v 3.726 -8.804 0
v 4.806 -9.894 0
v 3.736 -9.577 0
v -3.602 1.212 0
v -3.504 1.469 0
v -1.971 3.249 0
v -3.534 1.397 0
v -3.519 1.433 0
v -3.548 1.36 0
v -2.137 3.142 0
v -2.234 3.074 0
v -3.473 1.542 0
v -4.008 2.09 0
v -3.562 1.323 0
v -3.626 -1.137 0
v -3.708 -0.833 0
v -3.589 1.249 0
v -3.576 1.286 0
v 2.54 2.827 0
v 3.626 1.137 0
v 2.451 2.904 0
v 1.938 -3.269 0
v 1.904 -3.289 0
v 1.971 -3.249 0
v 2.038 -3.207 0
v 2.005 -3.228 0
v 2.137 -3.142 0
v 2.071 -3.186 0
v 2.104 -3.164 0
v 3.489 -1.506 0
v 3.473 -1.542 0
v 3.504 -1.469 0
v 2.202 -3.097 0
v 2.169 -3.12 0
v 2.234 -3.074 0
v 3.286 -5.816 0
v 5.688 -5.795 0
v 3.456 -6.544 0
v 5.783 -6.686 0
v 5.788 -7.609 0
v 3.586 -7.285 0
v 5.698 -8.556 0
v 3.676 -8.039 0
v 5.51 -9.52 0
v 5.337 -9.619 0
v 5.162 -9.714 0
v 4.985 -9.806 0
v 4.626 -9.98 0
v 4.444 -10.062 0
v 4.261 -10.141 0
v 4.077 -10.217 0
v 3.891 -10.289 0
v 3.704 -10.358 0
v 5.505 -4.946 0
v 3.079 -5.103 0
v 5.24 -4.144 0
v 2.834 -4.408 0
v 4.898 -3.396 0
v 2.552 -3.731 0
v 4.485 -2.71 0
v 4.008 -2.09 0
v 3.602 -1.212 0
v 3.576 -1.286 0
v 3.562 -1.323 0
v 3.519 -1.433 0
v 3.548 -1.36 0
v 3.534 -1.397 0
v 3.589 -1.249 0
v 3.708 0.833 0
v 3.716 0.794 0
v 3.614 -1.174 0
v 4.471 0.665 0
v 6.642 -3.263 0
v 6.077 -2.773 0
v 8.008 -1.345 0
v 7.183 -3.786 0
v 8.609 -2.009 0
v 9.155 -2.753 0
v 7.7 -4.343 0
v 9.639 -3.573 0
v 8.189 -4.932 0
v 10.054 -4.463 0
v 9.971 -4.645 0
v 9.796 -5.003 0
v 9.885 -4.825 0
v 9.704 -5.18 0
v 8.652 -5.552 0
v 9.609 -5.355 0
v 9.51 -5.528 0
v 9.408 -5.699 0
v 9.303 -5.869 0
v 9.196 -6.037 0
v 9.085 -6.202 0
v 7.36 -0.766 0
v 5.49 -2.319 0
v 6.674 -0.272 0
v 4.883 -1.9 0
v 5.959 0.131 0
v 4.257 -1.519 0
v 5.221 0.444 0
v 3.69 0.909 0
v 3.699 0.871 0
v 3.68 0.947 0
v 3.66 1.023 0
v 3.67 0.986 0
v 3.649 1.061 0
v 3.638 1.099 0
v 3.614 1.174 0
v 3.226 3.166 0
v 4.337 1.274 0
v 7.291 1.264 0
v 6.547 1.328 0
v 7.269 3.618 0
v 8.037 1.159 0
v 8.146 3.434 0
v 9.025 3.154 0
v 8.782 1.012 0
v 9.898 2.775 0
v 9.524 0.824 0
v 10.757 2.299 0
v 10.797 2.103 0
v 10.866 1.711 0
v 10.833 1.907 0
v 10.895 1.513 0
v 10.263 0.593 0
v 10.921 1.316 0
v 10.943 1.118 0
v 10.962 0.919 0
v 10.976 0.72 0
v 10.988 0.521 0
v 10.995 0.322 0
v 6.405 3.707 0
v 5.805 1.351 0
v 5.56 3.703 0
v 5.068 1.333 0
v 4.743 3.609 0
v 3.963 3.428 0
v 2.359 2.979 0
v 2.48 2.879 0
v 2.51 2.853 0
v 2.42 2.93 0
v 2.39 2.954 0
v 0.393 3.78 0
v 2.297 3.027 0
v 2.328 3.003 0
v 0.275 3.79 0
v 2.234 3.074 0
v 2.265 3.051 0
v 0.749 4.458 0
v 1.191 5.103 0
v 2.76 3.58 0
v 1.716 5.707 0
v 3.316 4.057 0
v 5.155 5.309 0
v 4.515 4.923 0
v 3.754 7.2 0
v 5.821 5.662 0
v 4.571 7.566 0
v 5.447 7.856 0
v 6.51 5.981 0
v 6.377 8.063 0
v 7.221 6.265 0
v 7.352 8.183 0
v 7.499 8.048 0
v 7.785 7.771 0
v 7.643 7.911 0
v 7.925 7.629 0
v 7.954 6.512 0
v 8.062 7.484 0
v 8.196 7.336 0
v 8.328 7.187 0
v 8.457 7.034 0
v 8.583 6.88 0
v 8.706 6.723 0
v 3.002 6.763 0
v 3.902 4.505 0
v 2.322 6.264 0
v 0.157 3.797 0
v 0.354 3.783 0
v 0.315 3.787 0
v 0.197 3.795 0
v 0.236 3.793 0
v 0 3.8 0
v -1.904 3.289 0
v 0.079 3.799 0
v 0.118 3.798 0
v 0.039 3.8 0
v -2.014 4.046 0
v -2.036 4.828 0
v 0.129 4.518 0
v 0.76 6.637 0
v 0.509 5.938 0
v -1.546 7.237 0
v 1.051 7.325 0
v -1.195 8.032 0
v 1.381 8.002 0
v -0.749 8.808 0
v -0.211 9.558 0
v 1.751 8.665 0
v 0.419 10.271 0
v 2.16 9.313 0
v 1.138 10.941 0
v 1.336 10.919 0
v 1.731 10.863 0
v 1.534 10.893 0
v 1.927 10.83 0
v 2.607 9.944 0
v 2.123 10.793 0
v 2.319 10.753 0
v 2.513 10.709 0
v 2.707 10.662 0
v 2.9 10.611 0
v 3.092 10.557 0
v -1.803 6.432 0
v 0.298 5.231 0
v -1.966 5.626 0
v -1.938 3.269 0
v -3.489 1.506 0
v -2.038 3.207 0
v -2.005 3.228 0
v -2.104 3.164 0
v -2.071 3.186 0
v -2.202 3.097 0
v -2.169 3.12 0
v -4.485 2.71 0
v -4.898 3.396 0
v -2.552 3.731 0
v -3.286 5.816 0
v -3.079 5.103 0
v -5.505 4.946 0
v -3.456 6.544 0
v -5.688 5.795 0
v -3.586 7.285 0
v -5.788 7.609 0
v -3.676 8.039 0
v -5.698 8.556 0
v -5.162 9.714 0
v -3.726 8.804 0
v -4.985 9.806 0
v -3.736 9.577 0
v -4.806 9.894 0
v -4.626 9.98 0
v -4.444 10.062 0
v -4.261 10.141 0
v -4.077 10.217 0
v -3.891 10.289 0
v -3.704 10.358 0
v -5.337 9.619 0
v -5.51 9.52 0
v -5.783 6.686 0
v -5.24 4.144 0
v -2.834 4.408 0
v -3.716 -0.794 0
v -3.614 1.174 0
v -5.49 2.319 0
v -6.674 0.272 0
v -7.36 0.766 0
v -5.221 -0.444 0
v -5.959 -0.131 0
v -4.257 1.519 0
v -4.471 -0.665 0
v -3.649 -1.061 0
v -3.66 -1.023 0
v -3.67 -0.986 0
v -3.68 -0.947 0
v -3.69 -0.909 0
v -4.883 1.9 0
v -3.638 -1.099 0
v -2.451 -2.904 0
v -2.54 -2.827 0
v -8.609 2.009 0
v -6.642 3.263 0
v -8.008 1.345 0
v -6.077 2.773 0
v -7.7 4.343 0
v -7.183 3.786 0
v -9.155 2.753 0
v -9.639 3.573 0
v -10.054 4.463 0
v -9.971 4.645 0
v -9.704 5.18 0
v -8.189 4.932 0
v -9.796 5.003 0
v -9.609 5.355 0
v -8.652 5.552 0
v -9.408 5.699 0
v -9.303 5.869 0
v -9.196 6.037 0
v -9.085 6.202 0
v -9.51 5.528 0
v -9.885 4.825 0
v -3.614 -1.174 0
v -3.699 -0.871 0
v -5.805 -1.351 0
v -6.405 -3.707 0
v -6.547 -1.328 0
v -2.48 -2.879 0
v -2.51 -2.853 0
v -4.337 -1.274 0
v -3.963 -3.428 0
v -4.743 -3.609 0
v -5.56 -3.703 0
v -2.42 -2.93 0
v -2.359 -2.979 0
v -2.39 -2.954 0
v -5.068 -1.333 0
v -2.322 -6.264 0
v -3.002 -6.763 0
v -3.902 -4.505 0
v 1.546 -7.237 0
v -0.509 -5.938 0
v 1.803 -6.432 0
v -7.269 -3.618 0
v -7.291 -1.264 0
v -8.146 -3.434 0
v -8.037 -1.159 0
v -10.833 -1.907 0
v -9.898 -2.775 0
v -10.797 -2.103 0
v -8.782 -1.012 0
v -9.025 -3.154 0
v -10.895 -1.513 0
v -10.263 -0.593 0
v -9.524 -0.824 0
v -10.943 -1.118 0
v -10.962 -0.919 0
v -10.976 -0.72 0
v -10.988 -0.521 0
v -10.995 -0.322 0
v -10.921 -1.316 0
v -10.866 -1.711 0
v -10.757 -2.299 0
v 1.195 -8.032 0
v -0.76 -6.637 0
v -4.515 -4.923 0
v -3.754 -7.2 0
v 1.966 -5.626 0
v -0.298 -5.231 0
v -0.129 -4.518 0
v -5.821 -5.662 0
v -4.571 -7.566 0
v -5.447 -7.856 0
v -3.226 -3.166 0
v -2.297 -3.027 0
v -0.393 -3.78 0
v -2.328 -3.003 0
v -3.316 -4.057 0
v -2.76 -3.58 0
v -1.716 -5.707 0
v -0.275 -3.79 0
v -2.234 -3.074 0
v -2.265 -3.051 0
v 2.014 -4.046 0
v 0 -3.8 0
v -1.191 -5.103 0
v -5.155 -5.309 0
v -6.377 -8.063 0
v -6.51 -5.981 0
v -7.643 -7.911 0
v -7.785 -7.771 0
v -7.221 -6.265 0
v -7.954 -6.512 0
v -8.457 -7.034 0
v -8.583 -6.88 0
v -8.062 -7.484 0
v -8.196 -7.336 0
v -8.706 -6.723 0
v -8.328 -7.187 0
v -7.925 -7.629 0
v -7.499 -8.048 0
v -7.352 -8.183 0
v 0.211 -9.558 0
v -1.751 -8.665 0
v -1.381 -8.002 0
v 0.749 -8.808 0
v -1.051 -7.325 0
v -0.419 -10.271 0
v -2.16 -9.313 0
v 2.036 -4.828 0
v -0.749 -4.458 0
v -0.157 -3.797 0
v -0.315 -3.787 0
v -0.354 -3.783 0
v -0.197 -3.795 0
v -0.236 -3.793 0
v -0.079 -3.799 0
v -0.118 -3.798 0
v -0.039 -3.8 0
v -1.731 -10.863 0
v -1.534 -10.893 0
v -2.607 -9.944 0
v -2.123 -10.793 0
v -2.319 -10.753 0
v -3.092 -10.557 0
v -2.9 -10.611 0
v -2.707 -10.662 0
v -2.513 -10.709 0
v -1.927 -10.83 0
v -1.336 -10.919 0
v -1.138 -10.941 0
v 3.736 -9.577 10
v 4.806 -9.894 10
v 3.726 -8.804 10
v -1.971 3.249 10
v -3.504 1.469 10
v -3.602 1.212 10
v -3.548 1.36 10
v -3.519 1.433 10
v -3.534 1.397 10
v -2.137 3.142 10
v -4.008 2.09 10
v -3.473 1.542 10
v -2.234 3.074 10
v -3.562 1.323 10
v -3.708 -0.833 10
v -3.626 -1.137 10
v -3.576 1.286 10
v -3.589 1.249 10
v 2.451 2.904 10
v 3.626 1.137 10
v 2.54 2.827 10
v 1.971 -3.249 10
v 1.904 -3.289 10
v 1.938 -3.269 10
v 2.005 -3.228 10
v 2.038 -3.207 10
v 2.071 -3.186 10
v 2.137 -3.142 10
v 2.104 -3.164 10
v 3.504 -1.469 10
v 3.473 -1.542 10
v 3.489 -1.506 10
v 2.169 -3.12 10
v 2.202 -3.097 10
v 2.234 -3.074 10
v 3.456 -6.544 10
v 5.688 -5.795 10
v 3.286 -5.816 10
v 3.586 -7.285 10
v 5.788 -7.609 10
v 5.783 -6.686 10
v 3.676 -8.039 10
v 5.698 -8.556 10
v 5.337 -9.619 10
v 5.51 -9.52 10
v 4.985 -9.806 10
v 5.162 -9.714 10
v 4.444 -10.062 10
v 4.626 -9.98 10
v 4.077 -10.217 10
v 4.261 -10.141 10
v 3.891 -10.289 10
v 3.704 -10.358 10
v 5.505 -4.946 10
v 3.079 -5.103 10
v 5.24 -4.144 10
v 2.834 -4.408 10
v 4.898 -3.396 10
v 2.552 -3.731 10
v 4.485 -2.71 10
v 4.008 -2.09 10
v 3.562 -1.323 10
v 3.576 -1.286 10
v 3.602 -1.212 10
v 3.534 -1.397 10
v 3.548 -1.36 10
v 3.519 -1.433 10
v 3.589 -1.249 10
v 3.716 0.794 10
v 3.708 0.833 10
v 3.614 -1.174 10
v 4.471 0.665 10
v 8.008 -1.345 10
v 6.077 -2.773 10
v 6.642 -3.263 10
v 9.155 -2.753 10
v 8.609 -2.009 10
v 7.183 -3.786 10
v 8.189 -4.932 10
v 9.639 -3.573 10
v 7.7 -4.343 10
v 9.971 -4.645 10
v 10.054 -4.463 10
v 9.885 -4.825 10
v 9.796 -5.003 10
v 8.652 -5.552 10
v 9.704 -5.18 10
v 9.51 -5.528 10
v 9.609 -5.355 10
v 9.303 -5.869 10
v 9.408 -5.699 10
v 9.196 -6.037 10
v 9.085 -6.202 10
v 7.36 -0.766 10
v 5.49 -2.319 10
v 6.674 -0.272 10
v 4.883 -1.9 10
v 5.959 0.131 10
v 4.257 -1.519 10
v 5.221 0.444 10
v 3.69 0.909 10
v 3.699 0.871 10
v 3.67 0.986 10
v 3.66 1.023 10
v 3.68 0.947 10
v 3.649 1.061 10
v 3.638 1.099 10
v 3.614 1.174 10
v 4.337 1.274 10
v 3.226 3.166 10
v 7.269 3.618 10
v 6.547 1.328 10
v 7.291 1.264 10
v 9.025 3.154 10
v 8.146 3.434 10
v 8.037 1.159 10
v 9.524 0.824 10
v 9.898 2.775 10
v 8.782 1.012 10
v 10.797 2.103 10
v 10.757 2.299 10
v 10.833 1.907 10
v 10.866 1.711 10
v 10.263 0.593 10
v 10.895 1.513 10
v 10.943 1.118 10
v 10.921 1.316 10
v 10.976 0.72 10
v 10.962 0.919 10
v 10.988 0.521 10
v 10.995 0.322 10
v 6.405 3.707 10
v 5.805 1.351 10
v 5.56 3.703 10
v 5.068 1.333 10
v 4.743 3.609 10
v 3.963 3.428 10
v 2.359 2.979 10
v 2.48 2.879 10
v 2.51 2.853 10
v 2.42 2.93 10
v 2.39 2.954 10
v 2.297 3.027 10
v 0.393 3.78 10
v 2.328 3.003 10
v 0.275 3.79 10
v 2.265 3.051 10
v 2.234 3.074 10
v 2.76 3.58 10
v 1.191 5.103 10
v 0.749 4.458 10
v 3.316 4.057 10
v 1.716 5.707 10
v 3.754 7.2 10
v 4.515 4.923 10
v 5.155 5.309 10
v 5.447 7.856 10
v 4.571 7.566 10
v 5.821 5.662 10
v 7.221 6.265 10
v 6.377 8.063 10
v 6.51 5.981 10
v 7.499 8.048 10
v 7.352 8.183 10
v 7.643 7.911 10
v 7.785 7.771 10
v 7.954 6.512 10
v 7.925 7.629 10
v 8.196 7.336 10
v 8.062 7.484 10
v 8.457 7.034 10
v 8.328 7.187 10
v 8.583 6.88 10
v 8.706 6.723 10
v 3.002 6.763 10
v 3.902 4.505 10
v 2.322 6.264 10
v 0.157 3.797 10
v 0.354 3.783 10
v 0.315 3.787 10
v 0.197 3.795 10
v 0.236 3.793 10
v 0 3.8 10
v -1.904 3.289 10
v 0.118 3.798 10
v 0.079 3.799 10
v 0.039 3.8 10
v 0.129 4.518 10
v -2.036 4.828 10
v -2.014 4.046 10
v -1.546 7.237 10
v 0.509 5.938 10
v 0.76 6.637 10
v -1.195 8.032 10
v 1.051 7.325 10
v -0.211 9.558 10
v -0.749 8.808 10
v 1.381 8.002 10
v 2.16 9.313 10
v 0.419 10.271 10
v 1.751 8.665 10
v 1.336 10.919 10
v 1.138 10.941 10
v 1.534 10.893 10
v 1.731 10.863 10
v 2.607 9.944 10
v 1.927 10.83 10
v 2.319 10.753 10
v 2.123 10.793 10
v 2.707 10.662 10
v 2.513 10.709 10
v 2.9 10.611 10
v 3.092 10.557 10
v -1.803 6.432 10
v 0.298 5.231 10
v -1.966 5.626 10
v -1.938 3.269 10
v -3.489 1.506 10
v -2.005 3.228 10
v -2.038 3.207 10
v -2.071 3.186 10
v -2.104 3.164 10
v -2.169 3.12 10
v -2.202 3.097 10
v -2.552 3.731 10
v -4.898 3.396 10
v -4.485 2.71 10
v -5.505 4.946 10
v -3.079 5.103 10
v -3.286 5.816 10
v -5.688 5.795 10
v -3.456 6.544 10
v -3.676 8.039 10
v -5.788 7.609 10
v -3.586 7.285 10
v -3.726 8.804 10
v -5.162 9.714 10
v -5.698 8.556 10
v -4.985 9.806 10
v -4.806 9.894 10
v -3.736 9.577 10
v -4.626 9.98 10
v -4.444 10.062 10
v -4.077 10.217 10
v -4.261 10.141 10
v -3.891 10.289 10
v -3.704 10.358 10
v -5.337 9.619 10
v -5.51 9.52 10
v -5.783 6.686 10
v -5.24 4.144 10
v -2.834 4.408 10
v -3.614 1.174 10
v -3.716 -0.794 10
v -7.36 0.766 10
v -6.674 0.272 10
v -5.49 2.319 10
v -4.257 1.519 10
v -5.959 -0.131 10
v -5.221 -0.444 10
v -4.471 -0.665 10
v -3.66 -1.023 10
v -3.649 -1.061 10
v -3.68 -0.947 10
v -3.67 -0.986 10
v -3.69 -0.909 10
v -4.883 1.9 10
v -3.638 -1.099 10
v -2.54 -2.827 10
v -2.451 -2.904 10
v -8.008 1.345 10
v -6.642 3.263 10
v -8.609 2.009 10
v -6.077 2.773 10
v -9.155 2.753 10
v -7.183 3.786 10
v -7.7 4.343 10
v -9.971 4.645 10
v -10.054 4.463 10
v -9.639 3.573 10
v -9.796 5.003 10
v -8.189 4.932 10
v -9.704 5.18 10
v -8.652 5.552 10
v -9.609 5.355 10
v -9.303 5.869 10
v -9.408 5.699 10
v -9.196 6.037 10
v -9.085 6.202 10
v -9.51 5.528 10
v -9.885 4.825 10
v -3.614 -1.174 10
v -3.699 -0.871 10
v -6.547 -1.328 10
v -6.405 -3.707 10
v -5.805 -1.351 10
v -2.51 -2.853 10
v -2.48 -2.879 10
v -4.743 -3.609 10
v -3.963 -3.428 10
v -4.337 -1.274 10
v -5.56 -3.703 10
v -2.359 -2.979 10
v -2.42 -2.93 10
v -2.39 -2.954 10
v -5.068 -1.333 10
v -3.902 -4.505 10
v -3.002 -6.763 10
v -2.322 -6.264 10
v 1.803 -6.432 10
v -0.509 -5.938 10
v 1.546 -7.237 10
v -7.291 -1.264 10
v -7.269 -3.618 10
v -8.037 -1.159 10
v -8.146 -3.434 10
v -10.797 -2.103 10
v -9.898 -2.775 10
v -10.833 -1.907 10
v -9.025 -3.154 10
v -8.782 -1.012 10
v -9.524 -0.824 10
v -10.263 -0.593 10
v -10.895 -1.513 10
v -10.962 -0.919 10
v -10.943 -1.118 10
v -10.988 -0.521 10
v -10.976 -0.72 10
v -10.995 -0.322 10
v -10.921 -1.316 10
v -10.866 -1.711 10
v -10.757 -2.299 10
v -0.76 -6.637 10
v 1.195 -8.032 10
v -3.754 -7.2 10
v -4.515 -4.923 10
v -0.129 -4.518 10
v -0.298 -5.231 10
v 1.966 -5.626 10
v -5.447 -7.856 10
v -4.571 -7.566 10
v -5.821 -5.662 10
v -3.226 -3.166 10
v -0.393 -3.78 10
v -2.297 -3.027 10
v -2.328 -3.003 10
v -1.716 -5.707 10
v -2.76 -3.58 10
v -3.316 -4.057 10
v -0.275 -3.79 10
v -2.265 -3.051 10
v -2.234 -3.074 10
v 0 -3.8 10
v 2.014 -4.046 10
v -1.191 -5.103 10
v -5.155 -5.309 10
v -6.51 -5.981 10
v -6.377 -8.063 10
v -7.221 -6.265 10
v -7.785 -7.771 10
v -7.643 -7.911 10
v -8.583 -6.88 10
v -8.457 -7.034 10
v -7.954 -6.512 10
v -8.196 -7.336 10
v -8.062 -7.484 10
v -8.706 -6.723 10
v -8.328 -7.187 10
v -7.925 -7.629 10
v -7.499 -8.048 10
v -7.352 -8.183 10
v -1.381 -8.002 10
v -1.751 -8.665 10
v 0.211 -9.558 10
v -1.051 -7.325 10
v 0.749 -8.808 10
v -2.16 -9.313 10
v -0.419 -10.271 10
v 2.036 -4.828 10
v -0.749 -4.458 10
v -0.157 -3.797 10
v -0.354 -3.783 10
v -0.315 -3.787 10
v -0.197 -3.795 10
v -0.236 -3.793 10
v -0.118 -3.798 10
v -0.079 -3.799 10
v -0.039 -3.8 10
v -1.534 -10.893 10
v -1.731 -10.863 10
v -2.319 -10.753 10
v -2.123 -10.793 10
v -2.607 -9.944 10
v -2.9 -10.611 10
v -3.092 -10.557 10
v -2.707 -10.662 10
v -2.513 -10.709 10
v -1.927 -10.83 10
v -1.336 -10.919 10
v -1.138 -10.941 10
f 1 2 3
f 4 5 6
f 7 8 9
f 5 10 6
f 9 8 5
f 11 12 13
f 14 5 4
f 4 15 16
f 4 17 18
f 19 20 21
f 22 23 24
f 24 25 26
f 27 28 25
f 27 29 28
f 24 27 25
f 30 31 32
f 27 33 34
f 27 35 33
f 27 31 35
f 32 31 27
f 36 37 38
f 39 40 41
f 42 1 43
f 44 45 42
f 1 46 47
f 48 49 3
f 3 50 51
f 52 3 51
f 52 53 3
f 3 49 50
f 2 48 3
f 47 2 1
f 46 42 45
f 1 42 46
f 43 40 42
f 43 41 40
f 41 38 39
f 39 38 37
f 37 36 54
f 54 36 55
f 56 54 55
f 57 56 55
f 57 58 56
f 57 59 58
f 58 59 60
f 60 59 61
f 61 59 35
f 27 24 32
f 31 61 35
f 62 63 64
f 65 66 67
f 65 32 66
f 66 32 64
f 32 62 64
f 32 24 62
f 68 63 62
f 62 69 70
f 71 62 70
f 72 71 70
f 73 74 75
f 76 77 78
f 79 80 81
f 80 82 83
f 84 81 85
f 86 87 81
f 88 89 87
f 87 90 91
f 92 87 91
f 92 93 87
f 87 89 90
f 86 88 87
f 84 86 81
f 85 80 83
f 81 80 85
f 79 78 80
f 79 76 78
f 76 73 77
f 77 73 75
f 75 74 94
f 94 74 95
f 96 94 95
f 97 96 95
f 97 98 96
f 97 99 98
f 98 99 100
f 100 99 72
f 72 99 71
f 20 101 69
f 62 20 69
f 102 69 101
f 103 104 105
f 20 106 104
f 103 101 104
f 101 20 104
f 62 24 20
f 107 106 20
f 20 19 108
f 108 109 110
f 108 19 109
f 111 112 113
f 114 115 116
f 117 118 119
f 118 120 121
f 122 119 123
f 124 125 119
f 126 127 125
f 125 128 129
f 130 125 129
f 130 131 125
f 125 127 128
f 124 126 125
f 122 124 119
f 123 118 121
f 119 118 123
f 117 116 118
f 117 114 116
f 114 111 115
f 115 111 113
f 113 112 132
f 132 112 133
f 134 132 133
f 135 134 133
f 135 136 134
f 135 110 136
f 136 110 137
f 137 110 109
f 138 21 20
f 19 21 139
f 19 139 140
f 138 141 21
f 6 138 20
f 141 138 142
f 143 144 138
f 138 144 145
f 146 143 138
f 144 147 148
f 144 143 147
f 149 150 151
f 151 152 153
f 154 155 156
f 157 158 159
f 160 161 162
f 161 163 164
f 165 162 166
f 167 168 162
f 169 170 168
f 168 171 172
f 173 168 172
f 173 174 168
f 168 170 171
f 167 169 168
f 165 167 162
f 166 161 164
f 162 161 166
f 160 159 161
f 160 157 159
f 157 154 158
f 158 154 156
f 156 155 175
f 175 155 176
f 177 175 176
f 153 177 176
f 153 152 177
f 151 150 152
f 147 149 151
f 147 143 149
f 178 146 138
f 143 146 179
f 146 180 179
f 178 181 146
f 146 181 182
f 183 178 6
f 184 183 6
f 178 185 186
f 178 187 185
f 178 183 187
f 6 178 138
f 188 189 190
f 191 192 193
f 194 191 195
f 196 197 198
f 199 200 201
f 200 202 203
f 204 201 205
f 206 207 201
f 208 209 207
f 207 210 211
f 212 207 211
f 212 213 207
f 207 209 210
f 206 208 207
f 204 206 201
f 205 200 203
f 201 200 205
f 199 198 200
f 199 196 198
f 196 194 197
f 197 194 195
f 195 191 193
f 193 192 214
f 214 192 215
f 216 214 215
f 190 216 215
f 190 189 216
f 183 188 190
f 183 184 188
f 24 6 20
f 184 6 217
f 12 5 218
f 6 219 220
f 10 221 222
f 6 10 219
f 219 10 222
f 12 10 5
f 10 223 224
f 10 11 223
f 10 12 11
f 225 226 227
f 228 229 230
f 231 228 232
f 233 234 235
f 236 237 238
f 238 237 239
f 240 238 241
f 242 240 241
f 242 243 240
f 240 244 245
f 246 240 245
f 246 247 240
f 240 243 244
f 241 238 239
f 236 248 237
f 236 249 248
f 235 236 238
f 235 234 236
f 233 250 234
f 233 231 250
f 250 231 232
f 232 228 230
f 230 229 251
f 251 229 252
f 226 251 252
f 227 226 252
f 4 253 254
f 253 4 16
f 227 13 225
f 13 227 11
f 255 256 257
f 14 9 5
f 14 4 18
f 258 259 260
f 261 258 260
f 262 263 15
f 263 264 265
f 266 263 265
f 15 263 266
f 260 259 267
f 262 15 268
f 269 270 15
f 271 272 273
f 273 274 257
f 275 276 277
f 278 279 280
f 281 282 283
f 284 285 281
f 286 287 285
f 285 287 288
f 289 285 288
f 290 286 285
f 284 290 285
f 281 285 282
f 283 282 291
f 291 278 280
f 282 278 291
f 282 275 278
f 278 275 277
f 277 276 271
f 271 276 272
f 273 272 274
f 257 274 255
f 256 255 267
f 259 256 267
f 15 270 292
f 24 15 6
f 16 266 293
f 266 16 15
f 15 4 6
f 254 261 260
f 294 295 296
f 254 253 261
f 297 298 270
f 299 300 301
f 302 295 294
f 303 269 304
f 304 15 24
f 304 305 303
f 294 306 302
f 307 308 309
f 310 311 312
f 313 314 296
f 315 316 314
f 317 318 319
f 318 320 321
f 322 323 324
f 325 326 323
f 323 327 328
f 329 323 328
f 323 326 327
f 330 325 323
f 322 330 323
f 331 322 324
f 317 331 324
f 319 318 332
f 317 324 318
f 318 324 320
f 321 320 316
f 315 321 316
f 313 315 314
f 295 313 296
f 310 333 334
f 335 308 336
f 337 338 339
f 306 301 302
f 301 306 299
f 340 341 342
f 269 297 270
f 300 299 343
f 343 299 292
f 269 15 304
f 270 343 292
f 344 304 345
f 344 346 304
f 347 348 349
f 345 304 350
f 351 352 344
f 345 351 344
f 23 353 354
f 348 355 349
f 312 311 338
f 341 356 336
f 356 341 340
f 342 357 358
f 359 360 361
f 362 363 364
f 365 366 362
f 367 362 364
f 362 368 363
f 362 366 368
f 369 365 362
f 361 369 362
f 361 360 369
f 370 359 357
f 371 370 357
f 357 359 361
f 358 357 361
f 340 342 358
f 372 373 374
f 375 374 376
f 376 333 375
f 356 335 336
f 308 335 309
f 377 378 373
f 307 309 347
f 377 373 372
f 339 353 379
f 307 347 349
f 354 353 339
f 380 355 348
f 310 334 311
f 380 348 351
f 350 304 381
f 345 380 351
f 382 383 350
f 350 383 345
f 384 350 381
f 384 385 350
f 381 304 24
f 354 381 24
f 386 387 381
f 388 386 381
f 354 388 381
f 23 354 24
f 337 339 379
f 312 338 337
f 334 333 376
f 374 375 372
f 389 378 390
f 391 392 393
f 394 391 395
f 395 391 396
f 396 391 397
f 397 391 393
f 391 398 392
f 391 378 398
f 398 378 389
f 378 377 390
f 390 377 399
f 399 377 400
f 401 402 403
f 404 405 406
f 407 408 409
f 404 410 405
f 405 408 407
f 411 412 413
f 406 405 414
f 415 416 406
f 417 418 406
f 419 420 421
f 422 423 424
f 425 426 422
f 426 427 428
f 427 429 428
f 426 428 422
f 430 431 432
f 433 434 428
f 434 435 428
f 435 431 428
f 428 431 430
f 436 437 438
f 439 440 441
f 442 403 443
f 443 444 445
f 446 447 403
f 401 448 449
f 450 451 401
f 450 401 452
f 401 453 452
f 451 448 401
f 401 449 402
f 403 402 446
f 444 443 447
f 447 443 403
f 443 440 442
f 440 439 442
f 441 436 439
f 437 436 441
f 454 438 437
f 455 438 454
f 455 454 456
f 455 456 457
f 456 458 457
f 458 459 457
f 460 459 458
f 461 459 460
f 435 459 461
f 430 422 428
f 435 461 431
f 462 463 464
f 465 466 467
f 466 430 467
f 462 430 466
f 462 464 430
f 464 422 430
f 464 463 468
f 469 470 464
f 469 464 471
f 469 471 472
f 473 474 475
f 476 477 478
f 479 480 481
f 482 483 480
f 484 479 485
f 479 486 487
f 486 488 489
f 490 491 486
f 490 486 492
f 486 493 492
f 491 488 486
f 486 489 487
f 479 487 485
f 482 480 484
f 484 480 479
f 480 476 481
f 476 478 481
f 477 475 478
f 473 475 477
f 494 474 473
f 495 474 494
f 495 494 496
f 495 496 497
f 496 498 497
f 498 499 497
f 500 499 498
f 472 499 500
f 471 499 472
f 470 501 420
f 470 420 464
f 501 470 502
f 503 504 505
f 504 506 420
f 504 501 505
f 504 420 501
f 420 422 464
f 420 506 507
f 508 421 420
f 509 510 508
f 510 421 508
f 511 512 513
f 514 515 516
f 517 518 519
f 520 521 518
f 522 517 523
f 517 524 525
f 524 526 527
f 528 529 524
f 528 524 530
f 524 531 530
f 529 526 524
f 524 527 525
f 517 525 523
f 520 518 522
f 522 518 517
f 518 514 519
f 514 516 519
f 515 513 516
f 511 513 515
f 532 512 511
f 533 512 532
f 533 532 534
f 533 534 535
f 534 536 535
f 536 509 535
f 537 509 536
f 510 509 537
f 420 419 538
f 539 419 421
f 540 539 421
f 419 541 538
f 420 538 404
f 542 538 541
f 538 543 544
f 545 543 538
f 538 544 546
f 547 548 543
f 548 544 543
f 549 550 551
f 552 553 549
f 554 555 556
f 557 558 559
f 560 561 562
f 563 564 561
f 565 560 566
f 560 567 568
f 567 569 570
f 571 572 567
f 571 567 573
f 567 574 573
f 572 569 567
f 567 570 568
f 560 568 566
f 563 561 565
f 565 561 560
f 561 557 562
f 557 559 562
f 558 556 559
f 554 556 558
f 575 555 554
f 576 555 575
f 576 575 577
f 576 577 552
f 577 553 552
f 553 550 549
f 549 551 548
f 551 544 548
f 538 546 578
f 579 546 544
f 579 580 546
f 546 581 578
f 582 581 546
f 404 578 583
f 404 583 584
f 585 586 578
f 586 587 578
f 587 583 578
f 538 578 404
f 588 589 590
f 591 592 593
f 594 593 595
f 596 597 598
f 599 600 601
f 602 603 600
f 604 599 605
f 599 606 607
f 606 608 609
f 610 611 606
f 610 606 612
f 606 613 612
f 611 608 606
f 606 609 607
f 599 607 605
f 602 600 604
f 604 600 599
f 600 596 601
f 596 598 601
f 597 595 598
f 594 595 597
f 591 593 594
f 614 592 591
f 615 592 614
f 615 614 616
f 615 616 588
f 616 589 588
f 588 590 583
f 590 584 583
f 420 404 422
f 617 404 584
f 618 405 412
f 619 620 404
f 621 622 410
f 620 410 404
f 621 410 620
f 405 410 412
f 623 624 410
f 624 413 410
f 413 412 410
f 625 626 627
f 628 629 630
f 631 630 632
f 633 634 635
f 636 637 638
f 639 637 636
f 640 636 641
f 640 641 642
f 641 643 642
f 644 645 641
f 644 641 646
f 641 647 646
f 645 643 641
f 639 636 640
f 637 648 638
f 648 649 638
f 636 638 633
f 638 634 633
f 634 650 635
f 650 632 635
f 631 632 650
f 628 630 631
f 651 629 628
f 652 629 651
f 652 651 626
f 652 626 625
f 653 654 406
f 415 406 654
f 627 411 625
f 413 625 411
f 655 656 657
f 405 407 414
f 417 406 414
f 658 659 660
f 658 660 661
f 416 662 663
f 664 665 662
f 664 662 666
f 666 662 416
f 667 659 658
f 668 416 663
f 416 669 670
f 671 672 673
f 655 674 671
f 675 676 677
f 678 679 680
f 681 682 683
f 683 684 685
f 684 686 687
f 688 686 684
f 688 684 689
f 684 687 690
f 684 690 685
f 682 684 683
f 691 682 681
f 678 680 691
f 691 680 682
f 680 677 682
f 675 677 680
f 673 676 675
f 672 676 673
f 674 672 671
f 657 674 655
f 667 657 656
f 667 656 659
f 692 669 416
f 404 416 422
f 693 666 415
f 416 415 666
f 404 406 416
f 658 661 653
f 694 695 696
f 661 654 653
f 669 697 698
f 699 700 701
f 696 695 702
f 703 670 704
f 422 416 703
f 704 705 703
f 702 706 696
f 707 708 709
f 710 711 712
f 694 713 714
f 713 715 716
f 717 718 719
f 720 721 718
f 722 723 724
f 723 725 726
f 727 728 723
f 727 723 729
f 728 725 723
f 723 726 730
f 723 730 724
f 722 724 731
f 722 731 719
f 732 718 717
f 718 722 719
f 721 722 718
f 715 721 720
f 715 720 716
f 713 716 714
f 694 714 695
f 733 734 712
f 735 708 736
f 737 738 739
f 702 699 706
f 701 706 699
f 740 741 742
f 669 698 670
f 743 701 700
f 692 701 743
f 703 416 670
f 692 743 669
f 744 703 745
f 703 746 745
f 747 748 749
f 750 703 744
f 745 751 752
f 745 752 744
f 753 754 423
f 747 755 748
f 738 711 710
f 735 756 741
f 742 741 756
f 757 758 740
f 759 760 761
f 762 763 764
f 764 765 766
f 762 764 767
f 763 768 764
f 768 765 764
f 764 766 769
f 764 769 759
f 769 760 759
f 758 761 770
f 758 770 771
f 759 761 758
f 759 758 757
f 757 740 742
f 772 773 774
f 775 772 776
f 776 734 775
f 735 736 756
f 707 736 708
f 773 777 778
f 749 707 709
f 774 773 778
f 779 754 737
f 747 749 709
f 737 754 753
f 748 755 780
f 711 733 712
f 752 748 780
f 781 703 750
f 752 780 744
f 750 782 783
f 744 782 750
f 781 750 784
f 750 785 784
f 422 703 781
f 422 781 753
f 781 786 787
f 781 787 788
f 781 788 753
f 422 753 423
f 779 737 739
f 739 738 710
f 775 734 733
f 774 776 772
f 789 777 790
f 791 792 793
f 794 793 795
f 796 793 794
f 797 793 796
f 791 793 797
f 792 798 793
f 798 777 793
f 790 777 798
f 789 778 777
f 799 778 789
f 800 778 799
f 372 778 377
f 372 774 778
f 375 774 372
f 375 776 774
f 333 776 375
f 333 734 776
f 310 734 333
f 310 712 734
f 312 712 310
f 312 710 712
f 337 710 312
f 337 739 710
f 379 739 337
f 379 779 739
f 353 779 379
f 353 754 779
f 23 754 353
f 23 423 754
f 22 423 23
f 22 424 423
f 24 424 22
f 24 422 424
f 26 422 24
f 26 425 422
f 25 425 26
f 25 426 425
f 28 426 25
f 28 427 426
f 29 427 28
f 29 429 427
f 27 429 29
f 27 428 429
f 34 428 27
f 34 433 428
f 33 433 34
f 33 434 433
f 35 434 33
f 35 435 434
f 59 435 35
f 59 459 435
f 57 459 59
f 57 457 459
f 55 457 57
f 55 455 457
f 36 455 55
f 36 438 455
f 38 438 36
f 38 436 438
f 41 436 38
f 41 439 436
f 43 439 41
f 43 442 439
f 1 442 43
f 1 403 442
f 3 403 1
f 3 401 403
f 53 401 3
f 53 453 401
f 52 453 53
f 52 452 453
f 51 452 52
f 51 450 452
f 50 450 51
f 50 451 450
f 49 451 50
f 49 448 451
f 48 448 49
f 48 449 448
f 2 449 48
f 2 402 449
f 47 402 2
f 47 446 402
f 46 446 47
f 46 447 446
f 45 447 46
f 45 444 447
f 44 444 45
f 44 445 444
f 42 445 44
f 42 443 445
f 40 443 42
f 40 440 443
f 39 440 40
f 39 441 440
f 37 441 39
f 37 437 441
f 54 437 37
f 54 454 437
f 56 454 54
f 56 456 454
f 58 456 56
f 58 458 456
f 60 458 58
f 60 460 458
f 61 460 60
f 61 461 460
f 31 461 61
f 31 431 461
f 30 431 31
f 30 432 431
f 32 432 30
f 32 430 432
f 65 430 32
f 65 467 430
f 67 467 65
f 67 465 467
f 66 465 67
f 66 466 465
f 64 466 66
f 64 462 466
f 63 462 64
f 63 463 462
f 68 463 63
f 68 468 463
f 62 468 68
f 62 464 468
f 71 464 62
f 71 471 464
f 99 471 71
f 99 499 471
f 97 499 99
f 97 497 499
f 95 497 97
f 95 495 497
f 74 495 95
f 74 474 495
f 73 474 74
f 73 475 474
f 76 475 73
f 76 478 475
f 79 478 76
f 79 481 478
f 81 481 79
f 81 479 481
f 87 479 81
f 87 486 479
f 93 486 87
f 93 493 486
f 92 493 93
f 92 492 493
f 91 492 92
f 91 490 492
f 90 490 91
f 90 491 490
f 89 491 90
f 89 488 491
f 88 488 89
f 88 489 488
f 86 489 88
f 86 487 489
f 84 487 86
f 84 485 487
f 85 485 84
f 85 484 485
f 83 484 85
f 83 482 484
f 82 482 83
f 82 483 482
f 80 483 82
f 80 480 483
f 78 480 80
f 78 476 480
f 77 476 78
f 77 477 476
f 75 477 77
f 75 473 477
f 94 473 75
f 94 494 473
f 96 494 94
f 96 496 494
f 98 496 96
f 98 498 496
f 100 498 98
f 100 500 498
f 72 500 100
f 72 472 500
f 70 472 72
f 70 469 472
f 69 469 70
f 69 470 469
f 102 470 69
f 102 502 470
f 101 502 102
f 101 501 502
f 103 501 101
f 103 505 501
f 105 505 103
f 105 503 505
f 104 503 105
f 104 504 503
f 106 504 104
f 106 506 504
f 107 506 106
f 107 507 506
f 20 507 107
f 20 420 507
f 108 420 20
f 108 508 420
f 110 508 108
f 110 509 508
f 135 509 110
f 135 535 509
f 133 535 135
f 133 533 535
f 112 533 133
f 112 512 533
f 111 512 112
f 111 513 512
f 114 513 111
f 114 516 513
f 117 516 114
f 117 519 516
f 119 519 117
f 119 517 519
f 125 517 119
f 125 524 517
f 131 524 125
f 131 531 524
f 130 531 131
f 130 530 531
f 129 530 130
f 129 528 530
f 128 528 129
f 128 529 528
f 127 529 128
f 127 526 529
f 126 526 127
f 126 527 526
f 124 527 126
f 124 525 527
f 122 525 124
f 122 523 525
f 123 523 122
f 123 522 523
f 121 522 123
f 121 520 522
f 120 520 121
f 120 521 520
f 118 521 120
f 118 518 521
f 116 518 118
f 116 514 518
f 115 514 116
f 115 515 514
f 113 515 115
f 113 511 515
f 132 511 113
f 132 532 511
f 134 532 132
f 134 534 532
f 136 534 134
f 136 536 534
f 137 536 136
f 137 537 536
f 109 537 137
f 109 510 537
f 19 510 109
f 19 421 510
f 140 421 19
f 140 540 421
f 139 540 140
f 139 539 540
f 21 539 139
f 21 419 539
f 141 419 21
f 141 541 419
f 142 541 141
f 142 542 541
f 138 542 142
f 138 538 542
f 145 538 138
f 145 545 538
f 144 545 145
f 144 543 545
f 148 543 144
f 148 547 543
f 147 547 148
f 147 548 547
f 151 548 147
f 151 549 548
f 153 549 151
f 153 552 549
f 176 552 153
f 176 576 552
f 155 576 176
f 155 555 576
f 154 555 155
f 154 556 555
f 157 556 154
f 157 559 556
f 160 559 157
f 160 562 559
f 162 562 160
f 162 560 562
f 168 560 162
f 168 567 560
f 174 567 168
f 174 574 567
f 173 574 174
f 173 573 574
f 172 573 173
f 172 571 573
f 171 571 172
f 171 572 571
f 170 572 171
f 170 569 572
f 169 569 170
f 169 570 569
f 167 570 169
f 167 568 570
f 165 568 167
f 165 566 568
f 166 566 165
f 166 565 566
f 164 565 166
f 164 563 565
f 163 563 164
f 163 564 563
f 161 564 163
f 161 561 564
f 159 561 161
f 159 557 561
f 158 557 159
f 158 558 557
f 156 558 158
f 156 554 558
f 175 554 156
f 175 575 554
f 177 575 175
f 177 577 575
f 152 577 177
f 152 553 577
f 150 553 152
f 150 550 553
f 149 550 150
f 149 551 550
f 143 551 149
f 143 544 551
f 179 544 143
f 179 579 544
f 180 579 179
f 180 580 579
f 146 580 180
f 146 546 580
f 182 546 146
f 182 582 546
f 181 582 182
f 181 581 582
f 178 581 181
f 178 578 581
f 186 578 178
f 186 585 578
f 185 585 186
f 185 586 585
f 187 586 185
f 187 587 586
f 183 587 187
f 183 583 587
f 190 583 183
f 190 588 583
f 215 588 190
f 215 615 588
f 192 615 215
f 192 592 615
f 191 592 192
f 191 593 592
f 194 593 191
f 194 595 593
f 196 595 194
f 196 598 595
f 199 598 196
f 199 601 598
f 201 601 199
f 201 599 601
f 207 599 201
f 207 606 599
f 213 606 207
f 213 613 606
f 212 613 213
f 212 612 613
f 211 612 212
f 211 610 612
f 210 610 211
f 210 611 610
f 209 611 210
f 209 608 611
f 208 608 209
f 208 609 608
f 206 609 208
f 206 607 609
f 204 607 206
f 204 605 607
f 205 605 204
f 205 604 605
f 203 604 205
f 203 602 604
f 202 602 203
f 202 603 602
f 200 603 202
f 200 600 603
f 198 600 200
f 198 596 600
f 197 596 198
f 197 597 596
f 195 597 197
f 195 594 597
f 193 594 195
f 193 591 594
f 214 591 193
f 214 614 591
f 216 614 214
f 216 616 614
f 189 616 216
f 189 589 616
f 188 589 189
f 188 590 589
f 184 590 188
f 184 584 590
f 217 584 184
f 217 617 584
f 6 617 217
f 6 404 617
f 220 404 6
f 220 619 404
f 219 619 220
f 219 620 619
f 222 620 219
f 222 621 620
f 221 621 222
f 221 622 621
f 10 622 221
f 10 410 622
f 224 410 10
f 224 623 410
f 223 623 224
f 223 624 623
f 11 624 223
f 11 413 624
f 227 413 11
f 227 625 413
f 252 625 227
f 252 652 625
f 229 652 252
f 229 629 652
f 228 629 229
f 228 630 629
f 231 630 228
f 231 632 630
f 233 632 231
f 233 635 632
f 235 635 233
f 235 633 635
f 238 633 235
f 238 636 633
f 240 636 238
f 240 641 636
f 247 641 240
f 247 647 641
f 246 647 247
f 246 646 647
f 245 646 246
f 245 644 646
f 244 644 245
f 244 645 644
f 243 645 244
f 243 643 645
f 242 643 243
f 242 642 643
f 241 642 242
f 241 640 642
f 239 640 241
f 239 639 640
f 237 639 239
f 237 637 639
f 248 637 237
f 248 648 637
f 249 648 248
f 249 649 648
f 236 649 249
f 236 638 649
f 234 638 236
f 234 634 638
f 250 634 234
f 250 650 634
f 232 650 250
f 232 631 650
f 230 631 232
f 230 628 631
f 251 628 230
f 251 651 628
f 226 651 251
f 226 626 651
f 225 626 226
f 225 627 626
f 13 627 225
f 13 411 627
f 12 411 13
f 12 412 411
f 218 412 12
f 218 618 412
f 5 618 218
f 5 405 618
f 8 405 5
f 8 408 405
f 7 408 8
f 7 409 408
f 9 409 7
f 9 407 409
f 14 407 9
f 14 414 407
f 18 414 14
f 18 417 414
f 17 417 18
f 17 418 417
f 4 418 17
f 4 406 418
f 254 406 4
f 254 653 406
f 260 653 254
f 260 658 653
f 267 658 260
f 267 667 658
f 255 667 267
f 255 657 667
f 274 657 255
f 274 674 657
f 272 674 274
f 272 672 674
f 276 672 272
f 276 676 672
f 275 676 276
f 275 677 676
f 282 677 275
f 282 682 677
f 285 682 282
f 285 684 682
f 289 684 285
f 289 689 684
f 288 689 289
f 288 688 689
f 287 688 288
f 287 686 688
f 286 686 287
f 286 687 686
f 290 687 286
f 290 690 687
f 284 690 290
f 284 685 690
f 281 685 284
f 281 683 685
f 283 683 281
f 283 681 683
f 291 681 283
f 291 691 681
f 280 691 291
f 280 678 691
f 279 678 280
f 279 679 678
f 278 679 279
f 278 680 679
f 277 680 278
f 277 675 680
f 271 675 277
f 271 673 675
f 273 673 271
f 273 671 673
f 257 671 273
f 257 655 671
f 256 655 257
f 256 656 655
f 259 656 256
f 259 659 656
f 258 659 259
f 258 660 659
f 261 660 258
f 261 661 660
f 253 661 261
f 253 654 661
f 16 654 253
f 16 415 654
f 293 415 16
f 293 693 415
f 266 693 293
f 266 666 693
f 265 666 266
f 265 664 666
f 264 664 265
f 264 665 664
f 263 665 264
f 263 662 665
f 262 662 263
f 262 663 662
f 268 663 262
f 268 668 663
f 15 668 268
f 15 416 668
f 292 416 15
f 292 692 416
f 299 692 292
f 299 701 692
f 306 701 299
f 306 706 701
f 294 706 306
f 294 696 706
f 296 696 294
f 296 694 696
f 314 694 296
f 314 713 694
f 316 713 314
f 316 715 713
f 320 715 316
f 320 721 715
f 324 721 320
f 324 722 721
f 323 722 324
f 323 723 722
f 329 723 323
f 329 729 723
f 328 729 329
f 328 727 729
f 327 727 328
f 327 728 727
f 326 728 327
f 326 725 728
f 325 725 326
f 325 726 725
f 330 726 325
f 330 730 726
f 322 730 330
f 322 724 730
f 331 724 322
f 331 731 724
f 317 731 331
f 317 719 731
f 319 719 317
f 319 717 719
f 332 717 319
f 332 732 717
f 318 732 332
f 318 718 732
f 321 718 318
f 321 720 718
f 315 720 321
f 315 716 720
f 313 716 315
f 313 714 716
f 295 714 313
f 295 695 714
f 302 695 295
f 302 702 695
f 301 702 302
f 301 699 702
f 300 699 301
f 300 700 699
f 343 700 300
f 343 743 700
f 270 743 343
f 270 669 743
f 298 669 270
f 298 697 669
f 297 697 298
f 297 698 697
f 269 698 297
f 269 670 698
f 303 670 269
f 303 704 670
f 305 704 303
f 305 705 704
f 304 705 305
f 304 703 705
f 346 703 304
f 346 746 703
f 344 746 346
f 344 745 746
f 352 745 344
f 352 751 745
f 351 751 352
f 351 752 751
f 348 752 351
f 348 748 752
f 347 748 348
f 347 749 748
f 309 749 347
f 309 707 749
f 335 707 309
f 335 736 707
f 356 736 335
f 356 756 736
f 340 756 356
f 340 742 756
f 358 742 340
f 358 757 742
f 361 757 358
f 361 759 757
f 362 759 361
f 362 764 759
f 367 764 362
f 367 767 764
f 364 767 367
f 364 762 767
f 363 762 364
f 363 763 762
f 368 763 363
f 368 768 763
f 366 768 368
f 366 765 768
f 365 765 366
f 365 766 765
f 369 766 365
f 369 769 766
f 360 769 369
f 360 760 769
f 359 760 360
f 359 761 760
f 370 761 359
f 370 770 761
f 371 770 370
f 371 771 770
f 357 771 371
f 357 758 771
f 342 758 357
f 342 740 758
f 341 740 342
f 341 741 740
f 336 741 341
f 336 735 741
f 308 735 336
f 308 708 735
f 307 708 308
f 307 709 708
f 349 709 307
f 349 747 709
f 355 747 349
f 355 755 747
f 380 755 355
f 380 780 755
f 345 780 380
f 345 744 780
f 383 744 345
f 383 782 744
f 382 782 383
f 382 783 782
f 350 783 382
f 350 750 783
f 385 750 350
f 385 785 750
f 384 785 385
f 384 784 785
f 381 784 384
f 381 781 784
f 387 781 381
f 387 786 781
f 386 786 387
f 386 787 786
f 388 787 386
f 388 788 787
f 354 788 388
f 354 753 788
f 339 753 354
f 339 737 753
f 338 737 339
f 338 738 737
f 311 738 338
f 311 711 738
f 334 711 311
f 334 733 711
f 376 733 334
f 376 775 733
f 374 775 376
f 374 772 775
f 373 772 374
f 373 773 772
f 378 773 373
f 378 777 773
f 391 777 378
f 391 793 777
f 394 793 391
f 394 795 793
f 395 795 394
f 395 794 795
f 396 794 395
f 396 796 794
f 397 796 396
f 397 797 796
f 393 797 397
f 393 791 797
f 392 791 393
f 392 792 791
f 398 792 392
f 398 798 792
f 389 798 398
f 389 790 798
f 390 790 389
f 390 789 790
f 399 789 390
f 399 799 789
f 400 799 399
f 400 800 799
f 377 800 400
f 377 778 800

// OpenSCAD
pi=3.1415926/1;
nozzle=0.4;
rod=6;
tolerance=1;
shell=20;
compression=1;
n=10;
part="tube"; //[spring, tube]
module spring() {
ri=rod/2+nozzle+tolerance-compression+nozzle;
ro=shell/2+compression;
s=ri*pi/n+2*nozzle;
ai=360/n-360*s/(2*ri*pi);
ao=360*s/(2*ro*pi);
echo(s);
skew=36;
function pol(r,a)=[r*sin(a),r*cos(a)];
shape=[
  for (j=[0:360/n:360-360/n]) each [
    for (i=[0:0.1:0.9]) pol(ri,j+ai*i),
    for (i=[0:0.1:0.9]) pol(ri+i*(ro-ri),j+ai+i*skew),
    for (i=[0:0.1:0.9]) pol(ro,j+skew+ai+i*ao),
    for (i=[0:0.1:0.9]) pol(ro+i*(ri-ro),j+skew+ao+ai+i*(360/n-skew-ao-ai))
  ]
];

// (ri,0) -> (ri,ai) -> (ro,skew+ai) -> (ro,skew+ao+ai) -> (ri,360/n)
linear_extrude(height=10)polygon(points=shape);
}
spring();
